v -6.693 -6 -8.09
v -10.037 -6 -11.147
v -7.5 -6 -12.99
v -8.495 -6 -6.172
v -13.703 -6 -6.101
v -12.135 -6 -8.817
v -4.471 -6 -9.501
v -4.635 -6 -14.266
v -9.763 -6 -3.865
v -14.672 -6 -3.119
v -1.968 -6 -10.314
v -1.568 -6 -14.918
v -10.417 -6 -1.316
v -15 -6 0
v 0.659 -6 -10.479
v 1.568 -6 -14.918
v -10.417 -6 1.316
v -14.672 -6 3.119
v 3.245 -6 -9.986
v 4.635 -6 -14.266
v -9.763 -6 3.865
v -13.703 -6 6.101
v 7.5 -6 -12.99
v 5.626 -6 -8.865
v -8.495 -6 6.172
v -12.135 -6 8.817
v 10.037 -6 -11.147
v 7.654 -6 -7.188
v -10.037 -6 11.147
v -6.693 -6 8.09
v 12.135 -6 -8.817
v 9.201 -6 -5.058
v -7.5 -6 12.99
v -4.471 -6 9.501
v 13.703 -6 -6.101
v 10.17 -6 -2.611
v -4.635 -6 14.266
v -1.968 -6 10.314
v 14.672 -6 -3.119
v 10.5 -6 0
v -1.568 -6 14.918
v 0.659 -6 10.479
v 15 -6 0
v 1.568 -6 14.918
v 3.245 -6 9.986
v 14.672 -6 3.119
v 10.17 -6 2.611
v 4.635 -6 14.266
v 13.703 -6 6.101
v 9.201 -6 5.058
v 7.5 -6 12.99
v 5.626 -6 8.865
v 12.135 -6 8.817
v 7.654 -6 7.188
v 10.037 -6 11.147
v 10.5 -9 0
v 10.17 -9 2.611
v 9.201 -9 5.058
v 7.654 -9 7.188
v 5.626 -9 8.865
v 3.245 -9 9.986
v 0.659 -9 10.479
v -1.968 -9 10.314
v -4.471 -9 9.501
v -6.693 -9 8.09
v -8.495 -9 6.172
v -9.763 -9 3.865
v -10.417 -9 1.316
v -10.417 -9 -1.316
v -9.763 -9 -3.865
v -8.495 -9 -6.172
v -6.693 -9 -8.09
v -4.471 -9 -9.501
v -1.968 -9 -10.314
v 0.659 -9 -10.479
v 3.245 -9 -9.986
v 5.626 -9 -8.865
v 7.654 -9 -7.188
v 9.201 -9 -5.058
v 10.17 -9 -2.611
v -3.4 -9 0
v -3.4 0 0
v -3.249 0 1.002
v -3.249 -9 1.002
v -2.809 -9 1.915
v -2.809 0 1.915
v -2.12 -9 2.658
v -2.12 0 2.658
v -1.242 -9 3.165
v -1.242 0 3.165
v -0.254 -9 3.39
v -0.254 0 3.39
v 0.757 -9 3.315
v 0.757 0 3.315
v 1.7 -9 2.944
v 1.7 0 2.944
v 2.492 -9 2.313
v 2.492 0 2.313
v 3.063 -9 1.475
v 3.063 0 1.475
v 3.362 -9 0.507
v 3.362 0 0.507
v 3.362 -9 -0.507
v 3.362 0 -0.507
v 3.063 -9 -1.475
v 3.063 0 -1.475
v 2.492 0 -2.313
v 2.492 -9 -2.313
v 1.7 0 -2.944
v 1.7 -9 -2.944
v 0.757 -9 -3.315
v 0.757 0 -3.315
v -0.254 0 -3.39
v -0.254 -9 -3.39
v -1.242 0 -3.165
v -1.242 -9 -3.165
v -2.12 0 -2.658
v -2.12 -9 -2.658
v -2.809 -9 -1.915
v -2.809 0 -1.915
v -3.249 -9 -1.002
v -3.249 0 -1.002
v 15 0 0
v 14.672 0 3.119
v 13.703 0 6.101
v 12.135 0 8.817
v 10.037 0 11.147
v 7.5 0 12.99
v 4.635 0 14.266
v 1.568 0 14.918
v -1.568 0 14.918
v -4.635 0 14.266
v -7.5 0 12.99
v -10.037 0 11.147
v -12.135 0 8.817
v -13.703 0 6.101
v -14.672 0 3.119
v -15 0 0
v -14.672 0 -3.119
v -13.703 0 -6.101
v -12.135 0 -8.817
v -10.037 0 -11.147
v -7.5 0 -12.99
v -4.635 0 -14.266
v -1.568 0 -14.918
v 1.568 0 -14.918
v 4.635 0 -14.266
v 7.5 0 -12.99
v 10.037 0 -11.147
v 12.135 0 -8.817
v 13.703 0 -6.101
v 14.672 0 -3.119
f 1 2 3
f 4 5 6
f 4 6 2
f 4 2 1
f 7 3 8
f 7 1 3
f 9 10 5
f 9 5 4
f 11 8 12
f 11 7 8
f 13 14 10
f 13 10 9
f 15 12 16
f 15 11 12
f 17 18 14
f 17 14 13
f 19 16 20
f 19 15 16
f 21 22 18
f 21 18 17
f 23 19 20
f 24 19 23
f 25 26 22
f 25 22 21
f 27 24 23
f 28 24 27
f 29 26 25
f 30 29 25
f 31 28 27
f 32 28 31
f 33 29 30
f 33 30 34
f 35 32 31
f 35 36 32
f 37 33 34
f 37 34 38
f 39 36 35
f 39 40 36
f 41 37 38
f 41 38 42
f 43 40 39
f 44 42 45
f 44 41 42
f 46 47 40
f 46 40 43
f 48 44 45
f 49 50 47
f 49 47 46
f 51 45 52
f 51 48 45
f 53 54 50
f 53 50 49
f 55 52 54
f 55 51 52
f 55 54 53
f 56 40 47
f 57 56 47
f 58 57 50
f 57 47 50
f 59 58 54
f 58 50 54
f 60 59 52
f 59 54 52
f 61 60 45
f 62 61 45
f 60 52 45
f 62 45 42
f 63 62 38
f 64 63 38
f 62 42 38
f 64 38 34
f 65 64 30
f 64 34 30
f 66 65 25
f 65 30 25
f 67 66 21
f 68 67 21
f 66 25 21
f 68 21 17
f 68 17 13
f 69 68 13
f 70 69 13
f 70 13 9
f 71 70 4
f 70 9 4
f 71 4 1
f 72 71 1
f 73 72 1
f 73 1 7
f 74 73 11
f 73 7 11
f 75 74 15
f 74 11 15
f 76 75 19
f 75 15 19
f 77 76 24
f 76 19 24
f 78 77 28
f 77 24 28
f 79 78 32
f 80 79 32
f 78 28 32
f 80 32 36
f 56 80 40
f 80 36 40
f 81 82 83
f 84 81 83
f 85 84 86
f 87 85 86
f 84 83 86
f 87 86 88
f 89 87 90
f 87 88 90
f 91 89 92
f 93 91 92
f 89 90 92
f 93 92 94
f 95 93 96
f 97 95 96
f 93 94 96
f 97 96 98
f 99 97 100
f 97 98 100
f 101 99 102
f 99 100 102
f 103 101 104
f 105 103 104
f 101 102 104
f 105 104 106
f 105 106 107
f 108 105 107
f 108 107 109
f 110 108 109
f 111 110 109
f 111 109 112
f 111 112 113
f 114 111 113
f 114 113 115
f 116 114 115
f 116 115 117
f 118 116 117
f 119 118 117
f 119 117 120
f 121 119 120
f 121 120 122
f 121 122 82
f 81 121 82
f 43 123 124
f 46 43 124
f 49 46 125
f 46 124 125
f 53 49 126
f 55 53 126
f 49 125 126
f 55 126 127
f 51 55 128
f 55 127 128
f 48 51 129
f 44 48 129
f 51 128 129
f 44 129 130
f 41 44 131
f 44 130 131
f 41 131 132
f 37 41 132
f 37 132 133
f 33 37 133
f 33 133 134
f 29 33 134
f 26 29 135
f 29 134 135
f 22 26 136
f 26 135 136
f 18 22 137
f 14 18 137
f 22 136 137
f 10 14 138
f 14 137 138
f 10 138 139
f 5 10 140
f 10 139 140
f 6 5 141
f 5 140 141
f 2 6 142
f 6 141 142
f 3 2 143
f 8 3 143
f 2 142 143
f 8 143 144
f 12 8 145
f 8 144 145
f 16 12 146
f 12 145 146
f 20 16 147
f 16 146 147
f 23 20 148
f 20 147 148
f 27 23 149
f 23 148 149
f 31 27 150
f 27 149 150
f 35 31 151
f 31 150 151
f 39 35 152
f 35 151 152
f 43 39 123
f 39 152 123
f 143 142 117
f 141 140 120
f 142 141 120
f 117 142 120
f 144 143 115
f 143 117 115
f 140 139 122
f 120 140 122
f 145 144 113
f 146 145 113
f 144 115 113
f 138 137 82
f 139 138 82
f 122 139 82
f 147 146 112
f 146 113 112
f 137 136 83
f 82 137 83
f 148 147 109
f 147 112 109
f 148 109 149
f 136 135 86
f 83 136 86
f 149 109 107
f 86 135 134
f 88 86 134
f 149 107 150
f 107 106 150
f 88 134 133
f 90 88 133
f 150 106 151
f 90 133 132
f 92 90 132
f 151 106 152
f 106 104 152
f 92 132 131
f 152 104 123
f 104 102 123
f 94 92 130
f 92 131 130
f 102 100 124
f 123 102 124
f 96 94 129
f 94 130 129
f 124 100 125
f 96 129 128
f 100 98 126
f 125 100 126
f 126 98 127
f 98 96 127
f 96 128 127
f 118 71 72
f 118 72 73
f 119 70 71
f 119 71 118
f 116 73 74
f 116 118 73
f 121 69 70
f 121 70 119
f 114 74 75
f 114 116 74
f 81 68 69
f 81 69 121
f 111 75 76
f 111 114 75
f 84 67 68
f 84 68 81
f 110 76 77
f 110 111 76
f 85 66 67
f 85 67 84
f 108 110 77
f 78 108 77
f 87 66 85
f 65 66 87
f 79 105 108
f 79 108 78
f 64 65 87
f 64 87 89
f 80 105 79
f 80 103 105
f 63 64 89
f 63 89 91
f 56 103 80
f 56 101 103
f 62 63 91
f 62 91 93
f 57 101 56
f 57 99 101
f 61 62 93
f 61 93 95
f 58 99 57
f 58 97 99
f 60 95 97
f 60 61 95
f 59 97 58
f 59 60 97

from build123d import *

# Parameters (mm, degrees)
F0_R     = 15
F1_DEPTH = 6
F2_R     = 10.5
F3_DEPTH = 3
F5_D     = 6.8
F5_DEPTH = 10


with BuildPart() as f1:
    # F0 (on Front) → F1 (new body)
    with BuildSketch(Plane.XZ):
        Circle(F0_R)
    extrude(amount=F1_DEPTH)

    # F2 (on face) → F3 (join)
    with BuildSketch(Plane.XZ.offset(6)):
        Circle(F2_R)
    extrude(amount=F3_DEPTH)

    # F5
    with Locations(Plane.XZ.offset(9)):
        with Locations((0, 0)):
            Hole(F5_D / 2, depth=F5_DEPTH)


solid = f1.part
